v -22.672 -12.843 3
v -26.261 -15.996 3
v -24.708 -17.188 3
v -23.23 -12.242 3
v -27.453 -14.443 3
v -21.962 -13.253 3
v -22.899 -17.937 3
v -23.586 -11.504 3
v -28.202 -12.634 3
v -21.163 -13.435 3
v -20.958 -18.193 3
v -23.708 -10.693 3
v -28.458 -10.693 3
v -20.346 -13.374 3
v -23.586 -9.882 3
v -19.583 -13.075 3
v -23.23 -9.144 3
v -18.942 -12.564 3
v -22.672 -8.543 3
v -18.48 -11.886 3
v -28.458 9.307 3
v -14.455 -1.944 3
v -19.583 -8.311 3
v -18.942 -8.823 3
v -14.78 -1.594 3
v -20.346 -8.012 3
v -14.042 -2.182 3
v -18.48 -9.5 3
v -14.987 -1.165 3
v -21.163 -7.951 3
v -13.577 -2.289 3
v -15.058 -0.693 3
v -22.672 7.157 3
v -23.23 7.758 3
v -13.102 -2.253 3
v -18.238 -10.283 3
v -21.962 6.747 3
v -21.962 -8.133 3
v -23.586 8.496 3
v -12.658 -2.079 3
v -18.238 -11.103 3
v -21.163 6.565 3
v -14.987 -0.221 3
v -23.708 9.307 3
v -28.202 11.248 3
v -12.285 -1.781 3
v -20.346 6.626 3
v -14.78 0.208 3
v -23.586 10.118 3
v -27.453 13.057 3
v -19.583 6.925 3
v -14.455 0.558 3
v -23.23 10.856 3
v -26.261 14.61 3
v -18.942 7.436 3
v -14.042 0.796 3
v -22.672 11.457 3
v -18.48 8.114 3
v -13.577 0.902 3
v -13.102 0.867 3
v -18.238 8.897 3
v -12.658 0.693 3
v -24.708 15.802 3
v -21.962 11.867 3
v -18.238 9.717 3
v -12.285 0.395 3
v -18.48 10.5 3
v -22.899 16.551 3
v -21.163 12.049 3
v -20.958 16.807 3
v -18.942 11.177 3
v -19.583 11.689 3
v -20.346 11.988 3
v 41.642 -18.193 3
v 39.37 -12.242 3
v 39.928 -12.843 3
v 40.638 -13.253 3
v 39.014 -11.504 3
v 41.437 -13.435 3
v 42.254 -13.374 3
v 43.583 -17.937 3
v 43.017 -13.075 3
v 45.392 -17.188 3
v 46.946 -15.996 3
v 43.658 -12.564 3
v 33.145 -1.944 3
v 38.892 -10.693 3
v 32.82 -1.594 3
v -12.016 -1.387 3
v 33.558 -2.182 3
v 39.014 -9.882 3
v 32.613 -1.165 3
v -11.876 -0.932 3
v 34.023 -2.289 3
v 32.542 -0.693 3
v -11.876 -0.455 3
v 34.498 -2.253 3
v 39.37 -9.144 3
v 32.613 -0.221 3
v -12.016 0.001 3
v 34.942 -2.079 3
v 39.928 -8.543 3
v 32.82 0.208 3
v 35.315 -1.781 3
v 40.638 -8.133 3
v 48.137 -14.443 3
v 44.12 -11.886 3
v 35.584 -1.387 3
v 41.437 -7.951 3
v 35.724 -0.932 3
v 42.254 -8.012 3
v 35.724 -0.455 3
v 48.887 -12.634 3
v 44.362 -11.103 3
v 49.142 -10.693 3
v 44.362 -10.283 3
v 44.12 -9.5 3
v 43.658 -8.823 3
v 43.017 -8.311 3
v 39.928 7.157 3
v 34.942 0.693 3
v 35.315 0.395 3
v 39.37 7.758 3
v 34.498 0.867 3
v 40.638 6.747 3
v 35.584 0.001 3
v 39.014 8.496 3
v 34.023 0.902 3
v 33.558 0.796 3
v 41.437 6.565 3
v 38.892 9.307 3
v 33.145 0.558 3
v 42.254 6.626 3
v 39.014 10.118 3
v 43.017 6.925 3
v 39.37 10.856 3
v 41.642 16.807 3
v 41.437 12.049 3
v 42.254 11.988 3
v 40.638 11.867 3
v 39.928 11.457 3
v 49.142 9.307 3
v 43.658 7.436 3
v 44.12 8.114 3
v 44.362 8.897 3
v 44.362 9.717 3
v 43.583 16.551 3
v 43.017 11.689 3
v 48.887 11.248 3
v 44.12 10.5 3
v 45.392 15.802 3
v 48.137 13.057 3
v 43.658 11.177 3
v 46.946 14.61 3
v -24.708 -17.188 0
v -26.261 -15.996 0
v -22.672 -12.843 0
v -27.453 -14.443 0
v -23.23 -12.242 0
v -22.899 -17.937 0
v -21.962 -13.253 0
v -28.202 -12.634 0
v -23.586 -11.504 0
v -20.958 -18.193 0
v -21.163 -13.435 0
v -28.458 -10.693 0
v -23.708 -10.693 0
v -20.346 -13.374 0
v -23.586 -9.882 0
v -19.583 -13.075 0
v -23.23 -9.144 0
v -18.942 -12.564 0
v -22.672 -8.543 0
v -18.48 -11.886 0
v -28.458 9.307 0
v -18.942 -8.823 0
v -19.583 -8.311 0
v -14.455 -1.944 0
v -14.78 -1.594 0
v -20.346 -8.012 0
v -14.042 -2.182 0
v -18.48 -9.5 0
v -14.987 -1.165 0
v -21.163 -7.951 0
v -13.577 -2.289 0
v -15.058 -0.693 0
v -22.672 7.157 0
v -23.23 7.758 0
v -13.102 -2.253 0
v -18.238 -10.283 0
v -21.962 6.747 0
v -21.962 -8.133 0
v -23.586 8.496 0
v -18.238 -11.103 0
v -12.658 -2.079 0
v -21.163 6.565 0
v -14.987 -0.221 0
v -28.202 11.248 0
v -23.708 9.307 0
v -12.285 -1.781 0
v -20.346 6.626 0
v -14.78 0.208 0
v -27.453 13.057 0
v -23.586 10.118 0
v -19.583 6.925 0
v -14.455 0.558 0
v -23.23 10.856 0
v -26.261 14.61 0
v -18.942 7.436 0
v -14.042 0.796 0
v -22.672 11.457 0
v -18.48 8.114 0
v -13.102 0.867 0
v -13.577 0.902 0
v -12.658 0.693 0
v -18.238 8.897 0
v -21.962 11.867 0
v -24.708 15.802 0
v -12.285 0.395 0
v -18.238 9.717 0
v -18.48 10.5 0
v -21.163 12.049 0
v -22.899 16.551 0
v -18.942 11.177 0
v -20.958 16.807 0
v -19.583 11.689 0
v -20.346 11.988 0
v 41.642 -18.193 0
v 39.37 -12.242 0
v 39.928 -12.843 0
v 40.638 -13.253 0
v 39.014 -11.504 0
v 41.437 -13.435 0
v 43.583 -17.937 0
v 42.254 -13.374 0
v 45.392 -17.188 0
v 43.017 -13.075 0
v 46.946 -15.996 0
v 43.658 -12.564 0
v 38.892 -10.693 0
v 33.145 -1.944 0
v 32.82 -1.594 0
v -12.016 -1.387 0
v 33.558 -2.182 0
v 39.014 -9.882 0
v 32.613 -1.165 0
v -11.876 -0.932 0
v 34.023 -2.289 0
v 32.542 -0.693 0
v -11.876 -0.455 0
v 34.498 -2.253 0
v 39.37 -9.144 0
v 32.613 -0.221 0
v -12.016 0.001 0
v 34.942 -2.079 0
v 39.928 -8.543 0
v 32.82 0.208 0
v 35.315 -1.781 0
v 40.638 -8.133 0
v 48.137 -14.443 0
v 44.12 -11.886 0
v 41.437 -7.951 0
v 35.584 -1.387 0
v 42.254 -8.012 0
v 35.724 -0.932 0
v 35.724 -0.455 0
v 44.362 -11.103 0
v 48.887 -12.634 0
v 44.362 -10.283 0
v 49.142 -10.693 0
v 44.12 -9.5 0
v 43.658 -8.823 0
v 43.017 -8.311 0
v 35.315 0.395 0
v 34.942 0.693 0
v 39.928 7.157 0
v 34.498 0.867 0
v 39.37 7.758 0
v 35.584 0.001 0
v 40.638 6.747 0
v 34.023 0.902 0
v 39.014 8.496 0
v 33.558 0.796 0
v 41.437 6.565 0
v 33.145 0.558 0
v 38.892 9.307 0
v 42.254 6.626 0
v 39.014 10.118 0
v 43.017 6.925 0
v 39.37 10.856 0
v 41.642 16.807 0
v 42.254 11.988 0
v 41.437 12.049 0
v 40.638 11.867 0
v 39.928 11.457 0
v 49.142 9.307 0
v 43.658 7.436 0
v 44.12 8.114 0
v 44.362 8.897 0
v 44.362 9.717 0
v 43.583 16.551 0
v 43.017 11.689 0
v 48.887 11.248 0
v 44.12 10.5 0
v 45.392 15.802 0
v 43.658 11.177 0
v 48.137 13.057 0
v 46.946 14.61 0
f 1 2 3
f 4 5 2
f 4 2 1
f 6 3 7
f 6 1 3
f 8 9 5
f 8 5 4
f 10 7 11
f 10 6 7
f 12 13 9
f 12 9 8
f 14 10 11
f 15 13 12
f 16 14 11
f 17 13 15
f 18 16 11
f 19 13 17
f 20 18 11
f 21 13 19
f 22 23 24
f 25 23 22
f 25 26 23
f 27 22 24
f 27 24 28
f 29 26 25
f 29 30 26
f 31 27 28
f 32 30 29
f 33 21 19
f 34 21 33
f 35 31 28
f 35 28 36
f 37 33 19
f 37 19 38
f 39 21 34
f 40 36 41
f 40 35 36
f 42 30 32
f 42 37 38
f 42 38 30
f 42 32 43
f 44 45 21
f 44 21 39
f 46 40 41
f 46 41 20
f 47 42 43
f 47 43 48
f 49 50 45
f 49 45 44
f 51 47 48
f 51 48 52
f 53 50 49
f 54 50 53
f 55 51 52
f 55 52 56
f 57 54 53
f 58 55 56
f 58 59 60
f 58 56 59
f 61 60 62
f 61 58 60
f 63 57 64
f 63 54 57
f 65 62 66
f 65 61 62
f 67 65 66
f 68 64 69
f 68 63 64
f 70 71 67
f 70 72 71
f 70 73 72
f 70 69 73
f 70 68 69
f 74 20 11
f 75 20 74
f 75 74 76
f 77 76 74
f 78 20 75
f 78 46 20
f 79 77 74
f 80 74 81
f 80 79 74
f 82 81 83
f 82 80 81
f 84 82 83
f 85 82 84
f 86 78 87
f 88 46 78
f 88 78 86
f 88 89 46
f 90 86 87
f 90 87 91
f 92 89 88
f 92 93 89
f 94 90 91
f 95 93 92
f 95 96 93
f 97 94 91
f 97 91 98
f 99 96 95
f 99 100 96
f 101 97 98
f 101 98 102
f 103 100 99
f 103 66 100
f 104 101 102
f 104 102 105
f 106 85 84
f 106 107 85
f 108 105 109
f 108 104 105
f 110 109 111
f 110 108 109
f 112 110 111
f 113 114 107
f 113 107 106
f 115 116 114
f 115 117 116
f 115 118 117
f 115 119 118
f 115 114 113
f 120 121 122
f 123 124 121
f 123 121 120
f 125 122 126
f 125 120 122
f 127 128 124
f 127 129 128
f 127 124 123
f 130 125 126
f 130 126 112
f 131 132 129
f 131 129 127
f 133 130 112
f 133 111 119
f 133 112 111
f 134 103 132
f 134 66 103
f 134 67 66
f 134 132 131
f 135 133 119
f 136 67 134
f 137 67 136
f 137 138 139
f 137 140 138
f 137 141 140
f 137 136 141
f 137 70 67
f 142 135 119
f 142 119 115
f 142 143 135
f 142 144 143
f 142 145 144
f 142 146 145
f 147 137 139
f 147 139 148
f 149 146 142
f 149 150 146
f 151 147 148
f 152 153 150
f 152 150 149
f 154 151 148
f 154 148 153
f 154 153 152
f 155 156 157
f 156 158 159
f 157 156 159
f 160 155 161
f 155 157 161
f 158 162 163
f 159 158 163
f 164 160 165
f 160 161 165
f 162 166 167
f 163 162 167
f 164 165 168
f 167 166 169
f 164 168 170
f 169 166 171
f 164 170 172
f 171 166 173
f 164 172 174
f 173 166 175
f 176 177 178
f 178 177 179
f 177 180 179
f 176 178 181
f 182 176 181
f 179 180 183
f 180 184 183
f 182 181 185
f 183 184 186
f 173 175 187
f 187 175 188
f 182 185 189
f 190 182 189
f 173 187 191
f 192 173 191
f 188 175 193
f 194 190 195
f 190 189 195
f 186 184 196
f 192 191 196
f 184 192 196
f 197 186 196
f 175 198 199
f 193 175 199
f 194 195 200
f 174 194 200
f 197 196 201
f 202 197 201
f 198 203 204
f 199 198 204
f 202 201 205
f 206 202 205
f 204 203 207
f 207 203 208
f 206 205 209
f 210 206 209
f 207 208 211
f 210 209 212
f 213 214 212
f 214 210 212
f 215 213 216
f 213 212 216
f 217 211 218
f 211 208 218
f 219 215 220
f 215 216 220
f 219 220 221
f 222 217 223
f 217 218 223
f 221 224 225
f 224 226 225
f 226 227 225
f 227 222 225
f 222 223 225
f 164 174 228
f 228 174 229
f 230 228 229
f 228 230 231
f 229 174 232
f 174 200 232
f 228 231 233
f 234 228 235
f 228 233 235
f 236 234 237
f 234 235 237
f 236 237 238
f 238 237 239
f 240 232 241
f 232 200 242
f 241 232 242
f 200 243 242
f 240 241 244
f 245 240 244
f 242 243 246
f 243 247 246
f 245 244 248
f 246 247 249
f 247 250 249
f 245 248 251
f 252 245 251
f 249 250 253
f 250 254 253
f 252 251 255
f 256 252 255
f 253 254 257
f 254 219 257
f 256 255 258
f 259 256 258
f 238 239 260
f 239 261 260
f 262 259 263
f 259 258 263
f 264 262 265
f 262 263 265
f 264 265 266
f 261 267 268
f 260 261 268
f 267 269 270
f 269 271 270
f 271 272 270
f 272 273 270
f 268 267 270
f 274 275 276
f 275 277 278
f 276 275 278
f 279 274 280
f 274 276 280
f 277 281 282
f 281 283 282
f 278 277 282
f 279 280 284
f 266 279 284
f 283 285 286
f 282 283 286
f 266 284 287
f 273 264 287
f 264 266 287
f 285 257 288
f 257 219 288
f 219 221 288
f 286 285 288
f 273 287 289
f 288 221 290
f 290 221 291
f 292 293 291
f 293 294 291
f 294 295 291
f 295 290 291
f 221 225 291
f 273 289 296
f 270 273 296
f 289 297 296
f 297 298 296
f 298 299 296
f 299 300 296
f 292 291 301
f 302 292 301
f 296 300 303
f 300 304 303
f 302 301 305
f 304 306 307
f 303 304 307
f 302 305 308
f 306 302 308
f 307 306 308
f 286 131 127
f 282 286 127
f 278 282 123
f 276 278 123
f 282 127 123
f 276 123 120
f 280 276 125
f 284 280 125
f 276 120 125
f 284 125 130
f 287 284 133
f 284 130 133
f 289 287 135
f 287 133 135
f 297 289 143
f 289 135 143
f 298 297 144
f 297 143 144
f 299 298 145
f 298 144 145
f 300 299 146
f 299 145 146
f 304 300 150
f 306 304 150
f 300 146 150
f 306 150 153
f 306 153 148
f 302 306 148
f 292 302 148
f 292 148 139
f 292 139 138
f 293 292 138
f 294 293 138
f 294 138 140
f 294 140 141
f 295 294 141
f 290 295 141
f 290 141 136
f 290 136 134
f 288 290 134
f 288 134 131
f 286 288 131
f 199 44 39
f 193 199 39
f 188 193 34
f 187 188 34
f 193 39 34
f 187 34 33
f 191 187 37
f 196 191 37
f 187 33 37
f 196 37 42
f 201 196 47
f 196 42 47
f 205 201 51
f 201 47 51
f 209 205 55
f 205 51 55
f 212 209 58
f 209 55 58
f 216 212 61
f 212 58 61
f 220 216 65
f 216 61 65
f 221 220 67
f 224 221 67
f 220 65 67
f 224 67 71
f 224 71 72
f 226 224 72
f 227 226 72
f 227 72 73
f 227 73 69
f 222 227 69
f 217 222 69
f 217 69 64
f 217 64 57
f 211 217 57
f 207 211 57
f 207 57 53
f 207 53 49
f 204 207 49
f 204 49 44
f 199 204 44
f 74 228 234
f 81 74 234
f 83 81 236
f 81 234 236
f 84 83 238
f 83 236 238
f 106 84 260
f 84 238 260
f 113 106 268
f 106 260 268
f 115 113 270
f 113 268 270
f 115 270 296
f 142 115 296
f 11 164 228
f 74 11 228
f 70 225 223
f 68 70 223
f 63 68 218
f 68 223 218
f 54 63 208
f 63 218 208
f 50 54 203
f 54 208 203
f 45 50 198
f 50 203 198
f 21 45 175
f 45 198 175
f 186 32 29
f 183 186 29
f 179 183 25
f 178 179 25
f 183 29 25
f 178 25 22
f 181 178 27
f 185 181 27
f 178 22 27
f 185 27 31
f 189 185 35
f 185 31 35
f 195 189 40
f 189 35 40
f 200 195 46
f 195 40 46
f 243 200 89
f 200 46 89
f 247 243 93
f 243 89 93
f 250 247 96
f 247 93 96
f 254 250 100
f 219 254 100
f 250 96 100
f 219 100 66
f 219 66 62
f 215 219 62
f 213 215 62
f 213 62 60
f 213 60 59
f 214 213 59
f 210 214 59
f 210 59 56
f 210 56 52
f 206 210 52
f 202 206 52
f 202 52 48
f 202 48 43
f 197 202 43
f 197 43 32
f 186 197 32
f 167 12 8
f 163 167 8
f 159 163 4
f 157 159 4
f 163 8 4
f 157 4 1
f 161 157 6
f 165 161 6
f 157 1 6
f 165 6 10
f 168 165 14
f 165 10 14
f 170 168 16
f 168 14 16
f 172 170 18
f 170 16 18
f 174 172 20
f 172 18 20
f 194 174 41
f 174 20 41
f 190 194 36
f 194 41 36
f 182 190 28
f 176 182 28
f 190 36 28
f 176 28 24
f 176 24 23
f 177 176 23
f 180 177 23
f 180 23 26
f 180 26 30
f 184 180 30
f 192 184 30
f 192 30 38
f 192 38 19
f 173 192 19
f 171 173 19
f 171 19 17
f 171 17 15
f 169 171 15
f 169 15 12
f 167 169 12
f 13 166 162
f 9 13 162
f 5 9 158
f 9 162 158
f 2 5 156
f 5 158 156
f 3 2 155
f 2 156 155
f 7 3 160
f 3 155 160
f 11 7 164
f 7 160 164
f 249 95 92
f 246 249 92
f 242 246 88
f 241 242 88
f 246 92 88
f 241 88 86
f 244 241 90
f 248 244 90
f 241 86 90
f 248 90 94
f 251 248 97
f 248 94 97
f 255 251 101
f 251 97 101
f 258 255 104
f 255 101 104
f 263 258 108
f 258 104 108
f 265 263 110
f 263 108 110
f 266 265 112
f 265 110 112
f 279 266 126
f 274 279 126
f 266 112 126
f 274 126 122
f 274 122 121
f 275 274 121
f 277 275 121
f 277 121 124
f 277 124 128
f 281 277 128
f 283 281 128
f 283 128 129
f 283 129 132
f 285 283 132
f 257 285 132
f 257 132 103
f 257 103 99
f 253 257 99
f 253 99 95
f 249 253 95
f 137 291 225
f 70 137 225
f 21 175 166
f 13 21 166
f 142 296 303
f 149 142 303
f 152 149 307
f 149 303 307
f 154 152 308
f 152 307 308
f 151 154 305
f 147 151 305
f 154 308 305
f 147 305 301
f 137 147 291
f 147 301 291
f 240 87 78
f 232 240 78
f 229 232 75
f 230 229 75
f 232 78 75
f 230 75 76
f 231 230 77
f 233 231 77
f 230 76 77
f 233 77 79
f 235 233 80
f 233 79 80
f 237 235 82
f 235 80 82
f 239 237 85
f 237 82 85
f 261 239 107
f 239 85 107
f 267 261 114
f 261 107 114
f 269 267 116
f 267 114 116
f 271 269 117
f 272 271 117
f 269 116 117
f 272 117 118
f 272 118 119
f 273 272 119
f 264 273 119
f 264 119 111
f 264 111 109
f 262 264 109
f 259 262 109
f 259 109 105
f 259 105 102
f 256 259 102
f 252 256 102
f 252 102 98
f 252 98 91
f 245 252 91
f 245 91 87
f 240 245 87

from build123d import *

# Parameters (mm, degrees)
F1_DEPTH = 3
F2_D     = 5.5
F3_D     = 3.2


with BuildPart() as f1:
    # F0 (on Top) → F1 (new body)
    with BuildSketch(Plane.XY):
        with BuildLine():
            Line((41.6422729686, 16.8069582433), (-20.9577269852, 16.8069582433))
            ThreePointArc((-20.9577269852, 16.8069582433), (-15.6544261263, 14.6102591021), (-13.4577269852, 9.3069582433))
            ThreePointArc((-13.4577269852, 9.3069582433), (-20.9577269852, 1.8069582433), (-28.4577269852, 9.3069582433))
            Line((-28.4577269852, 9.3069582433), (-28.4577269852, -10.6930417567))
            ThreePointArc((-28.4577269852, -10.6930417567), (-20.9577269852, -3.1930417567), (-13.4577269852, -10.6930417567))
            ThreePointArc((-13.4577269852, -10.6930417567), (-15.6544261263, -15.9963426156), (-20.9577269852, -18.1930417567))
            Line((-20.9577269852, -18.1930417567), (41.6422730148, -18.1930417567))
            ThreePointArc((41.6422730148, -18.1930417567), (36.3389721559, -5.3897408979), (49.1422730148, -10.6930417567))
            Line((49.1422730148, -10.6930417567), (49.1422730148, 9.3069582433))
            ThreePointArc((49.1422730148, 9.3069582433), (36.3389721722, 4.003657368), (41.6422729686, 16.8069582433))
        make_face()
        with BuildLine():
            ThreePointArc((49.1422730148, 9.3069582433), (46.9455738573, 14.6102591185), (41.6422729686, 16.8069582433))
            ThreePointArc((41.6422729686, 16.8069582433), (36.3389721722, 4.003657368), (49.1422730148, 9.3069582433))
        make_face()
        with BuildLine():
            ThreePointArc((-13.4577269852, 9.3069582433), (-15.6544261263, 14.6102591021), (-20.9577269852, 16.8069582433))
            ThreePointArc((-20.9577269852, 16.8069582433), (-26.2610278441, 14.6102591022), (-28.4577269852, 9.3069582433))
            ThreePointArc((-28.4577269852, 9.3069582433), (-20.9577269852, 1.8069582433), (-13.4577269852, 9.3069582433))
        make_face()
        with BuildLine():
            ThreePointArc((-13.4577269852, -10.6930417567), (-20.9577269852, -3.1930417567), (-28.4577269852, -10.6930417567))
            ThreePointArc((-28.4577269852, -10.6930417567), (-26.2610278441, -15.9963426156), (-20.9577269852, -18.1930417567))
            ThreePointArc((-20.9577269852, -18.1930417567), (-15.6544261263, -15.9963426156), (-13.4577269852, -10.6930417567))
        make_face()
        with BuildLine():
            ThreePointArc((41.6422730148, -18.1930417567), (46.9455738737, -15.9963426156), (49.1422730148, -10.6930417567))
            ThreePointArc((49.1422730148, -10.6930417567), (36.3389721559, -5.3897408979), (41.6422730148, -18.1930417567))
        make_face()
    extrude(amount=F1_DEPTH)

    # F2 (through all)
    with Locations(Plane(origin=(0, 0, 0), x_dir=(1, 0, 0), z_dir=(0, 0, -1))):
        with Locations((-20.9577269852, -9.3069582433), (-20.9577269852, 10.6930417567), (41.6422730148, 10.6930417567), (41.6422730148, -9.3069582433)):
            Hole(F2_D / 2)

    # F3 (through all)
    with Locations(Plane(origin=(0, 0, 0), x_dir=(1, 0, 0), z_dir=(0, 0, -1))):
        with Locations((-13.4577269852, 0.6930417567), (34.1422730148, 0.6930417567)):
            Hole(F3_D / 2)


solid = f1.part
